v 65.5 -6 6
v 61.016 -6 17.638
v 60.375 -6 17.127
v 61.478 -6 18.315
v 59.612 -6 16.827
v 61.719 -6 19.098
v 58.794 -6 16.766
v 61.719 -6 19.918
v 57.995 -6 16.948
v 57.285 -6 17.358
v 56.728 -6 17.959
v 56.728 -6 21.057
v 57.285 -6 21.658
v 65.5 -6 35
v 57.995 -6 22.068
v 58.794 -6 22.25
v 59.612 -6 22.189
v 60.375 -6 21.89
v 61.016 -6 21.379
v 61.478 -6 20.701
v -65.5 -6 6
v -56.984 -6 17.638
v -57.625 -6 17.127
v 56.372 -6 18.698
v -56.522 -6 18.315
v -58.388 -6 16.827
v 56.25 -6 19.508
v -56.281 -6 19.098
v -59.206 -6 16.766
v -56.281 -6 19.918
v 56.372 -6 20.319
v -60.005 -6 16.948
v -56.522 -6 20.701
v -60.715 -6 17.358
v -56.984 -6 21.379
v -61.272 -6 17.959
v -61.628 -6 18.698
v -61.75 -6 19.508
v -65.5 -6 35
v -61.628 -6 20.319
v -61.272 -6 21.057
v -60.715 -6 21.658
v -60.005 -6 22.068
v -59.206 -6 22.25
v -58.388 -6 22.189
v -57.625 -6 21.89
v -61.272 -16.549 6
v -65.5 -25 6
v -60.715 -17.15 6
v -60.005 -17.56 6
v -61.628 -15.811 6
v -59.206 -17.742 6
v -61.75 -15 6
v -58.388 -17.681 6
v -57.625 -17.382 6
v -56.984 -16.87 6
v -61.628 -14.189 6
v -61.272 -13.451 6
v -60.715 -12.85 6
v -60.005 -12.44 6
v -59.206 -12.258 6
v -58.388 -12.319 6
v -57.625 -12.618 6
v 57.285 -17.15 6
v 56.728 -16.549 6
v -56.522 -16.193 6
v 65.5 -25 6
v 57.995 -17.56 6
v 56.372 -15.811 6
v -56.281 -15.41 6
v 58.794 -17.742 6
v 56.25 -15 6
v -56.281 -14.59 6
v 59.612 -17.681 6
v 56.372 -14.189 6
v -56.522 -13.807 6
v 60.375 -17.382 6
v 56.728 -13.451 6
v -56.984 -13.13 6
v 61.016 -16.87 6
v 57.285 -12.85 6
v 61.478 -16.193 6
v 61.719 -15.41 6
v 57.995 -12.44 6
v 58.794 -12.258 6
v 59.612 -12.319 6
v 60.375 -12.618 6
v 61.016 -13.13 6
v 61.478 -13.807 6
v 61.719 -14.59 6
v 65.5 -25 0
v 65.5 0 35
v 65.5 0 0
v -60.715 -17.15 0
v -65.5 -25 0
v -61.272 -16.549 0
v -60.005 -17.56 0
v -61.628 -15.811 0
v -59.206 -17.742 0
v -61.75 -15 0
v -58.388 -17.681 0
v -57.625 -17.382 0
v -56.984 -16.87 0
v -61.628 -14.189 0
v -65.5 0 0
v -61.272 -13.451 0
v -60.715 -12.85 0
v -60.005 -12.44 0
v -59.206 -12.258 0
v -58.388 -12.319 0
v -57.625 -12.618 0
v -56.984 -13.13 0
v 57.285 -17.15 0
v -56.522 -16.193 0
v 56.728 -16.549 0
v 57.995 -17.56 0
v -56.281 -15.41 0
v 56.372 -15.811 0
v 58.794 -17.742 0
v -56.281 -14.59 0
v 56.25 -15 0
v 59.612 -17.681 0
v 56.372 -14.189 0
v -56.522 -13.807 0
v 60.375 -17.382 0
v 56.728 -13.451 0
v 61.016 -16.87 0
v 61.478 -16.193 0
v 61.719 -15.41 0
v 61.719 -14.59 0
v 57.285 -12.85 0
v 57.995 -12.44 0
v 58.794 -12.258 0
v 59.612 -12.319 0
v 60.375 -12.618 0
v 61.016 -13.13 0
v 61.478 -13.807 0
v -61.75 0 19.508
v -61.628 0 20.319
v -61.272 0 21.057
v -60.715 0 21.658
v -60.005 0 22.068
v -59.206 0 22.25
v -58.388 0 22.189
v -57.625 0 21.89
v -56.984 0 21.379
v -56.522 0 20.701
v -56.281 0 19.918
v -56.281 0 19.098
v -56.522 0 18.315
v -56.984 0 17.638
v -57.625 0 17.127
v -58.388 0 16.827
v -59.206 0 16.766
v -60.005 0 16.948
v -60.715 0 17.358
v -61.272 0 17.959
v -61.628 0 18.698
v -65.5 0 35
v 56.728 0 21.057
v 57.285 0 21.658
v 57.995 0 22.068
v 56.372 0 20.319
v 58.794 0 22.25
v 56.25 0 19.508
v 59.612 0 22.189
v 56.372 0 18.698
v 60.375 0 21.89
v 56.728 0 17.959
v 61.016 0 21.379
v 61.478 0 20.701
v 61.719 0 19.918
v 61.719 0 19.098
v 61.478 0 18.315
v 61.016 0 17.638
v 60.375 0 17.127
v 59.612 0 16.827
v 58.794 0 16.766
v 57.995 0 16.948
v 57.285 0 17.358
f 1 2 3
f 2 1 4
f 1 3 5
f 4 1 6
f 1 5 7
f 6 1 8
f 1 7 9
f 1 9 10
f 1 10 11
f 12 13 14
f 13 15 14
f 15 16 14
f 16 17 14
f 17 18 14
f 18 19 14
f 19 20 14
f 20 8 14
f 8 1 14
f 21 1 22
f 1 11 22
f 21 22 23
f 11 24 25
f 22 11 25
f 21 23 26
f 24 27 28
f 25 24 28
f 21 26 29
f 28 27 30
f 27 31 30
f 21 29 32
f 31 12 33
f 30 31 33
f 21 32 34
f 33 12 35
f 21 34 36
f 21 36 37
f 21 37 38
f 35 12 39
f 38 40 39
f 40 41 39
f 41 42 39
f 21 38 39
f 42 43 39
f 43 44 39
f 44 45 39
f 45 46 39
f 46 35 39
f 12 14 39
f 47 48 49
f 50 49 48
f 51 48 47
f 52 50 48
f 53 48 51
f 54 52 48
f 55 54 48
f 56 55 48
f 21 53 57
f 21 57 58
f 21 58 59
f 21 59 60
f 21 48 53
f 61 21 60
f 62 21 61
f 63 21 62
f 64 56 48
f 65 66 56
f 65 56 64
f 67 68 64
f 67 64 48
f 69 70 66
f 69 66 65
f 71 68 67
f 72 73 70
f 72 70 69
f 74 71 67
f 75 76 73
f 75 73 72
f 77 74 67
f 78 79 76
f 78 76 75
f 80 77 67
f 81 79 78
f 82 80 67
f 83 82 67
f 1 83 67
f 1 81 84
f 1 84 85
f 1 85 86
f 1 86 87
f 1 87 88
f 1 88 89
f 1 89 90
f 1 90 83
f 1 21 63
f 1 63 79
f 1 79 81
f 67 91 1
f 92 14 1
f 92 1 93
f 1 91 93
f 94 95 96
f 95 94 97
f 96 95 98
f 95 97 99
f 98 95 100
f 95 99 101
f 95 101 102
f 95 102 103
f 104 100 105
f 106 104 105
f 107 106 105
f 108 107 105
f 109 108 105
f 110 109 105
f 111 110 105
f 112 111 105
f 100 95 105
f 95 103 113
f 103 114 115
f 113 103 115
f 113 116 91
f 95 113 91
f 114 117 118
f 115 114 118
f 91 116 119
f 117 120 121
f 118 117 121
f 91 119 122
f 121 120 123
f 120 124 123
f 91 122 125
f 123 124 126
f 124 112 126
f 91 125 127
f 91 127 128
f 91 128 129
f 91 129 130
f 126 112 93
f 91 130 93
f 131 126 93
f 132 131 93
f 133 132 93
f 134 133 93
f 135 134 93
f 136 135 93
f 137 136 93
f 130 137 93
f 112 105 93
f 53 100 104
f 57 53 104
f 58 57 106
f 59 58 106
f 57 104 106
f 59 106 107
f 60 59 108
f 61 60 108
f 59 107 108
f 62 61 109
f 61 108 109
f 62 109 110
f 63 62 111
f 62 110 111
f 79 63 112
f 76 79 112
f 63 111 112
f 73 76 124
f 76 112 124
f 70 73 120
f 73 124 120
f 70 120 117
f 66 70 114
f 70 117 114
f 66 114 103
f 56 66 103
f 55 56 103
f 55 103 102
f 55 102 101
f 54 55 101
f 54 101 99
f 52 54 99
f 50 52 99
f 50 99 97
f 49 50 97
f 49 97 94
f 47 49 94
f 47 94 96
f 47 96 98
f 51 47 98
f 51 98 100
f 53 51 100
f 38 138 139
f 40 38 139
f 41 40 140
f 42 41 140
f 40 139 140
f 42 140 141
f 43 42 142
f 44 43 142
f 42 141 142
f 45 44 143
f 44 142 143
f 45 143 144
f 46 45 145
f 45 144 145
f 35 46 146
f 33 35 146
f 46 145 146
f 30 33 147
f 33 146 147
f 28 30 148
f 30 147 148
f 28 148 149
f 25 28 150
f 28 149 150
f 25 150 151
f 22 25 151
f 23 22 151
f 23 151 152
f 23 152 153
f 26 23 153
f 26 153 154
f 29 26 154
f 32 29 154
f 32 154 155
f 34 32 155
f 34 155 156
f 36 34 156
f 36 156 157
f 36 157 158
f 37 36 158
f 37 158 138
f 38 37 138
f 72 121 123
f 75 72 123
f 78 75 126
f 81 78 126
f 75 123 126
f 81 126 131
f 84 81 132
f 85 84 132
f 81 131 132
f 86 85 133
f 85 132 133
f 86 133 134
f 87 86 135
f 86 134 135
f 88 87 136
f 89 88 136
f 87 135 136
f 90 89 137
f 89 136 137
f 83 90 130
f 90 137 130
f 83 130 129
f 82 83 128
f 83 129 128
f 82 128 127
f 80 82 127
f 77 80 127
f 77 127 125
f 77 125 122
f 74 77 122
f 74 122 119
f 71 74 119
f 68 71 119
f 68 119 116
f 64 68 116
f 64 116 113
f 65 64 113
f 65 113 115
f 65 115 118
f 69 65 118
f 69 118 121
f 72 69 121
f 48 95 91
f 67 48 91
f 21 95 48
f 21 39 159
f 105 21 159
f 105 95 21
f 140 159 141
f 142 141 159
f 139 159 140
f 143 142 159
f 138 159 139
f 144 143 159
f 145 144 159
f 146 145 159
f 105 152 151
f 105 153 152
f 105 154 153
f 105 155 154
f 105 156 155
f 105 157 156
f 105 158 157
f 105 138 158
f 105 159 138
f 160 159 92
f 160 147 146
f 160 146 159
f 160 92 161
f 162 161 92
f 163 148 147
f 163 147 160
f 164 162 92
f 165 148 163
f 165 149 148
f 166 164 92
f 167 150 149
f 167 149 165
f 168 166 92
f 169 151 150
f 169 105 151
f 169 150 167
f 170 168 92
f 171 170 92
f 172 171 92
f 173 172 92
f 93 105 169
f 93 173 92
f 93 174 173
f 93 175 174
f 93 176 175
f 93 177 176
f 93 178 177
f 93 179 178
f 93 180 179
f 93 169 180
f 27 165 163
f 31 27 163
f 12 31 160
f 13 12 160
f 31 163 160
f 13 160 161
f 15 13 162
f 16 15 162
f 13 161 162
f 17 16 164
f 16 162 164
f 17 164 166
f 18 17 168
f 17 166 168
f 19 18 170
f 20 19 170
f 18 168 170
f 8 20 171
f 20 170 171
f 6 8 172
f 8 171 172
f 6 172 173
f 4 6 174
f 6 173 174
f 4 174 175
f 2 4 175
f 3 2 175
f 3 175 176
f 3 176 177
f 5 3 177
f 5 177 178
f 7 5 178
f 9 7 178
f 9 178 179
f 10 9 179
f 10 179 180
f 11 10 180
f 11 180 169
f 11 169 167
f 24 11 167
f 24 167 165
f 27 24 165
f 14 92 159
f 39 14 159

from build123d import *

# Parameters (mm, degrees)
SKETCH1_W                = 131
SKETCH1_H                = 25
EXTRUDE1_DEPTH           = 6
SKETCH2_W                = 131
SKETCH2_H                = 35
EXTRUDE2_DEPTH           = 6
M5_CLEARANCE_HOLE1_D     = 5.5
M5_CLEARANCE_HOLE1_DEPTH = 10
M5_CLEARANCE_HOLE1_TIP   = 1.652366702
M5_CLEARANCE_HOLE2_D     = 5.5
M5_CLEARANCE_HOLE2_DEPTH = 10
M5_CLEARANCE_HOLE2_TIP   = 1.652366702


with BuildPart() as part:
    # Sketch1 → Extrude1 (new body)
    with BuildSketch(Plane.XY):
        with Locations((0, -12.5)):
            Rectangle(SKETCH1_W, SKETCH1_H)
    extrude(amount=EXTRUDE1_DEPTH)

    # Sketch2 → Extrude2 (add)
    with BuildSketch(Plane(origin=(0, 0, 0), x_dir=(-1, 0, 0), z_dir=(0, 1, 0))):
        with Locations((0, 17.5)):
            Rectangle(SKETCH2_W, SKETCH2_H)
    extrude(amount=-EXTRUDE2_DEPTH)

    # M5 Clearance Hole1
    with Locations(Plane.XY.offset(6)):
        with Locations((59, -15), (-59, -15)):
            Hole(M5_CLEARANCE_HOLE1_D / 2, depth=M5_CLEARANCE_HOLE1_DEPTH)
            with Locations((0, 0, -(M5_CLEARANCE_HOLE1_DEPTH + M5_CLEARANCE_HOLE1_TIP / 2))):  # 118° drill point
                Cone(0, M5_CLEARANCE_HOLE1_D / 2, M5_CLEARANCE_HOLE1_TIP, mode=Mode.SUBTRACT)

    # M5 Clearance Hole2
    with Locations(Plane(origin=(0.415083287, -6, 44.50809769), x_dir=(1, 0, 0), z_dir=(0, -1, 0))):
        with Locations((58.584916713, -25), (-59.415083287, -25)):
            Hole(M5_CLEARANCE_HOLE2_D / 2, depth=M5_CLEARANCE_HOLE2_DEPTH)
            with Locations((0, 0, -(M5_CLEARANCE_HOLE2_DEPTH + M5_CLEARANCE_HOLE2_TIP / 2))):  # 118° drill point
                Cone(0, M5_CLEARANCE_HOLE2_D / 2, M5_CLEARANCE_HOLE2_TIP, mode=Mode.SUBTRACT)


solid = part.part
